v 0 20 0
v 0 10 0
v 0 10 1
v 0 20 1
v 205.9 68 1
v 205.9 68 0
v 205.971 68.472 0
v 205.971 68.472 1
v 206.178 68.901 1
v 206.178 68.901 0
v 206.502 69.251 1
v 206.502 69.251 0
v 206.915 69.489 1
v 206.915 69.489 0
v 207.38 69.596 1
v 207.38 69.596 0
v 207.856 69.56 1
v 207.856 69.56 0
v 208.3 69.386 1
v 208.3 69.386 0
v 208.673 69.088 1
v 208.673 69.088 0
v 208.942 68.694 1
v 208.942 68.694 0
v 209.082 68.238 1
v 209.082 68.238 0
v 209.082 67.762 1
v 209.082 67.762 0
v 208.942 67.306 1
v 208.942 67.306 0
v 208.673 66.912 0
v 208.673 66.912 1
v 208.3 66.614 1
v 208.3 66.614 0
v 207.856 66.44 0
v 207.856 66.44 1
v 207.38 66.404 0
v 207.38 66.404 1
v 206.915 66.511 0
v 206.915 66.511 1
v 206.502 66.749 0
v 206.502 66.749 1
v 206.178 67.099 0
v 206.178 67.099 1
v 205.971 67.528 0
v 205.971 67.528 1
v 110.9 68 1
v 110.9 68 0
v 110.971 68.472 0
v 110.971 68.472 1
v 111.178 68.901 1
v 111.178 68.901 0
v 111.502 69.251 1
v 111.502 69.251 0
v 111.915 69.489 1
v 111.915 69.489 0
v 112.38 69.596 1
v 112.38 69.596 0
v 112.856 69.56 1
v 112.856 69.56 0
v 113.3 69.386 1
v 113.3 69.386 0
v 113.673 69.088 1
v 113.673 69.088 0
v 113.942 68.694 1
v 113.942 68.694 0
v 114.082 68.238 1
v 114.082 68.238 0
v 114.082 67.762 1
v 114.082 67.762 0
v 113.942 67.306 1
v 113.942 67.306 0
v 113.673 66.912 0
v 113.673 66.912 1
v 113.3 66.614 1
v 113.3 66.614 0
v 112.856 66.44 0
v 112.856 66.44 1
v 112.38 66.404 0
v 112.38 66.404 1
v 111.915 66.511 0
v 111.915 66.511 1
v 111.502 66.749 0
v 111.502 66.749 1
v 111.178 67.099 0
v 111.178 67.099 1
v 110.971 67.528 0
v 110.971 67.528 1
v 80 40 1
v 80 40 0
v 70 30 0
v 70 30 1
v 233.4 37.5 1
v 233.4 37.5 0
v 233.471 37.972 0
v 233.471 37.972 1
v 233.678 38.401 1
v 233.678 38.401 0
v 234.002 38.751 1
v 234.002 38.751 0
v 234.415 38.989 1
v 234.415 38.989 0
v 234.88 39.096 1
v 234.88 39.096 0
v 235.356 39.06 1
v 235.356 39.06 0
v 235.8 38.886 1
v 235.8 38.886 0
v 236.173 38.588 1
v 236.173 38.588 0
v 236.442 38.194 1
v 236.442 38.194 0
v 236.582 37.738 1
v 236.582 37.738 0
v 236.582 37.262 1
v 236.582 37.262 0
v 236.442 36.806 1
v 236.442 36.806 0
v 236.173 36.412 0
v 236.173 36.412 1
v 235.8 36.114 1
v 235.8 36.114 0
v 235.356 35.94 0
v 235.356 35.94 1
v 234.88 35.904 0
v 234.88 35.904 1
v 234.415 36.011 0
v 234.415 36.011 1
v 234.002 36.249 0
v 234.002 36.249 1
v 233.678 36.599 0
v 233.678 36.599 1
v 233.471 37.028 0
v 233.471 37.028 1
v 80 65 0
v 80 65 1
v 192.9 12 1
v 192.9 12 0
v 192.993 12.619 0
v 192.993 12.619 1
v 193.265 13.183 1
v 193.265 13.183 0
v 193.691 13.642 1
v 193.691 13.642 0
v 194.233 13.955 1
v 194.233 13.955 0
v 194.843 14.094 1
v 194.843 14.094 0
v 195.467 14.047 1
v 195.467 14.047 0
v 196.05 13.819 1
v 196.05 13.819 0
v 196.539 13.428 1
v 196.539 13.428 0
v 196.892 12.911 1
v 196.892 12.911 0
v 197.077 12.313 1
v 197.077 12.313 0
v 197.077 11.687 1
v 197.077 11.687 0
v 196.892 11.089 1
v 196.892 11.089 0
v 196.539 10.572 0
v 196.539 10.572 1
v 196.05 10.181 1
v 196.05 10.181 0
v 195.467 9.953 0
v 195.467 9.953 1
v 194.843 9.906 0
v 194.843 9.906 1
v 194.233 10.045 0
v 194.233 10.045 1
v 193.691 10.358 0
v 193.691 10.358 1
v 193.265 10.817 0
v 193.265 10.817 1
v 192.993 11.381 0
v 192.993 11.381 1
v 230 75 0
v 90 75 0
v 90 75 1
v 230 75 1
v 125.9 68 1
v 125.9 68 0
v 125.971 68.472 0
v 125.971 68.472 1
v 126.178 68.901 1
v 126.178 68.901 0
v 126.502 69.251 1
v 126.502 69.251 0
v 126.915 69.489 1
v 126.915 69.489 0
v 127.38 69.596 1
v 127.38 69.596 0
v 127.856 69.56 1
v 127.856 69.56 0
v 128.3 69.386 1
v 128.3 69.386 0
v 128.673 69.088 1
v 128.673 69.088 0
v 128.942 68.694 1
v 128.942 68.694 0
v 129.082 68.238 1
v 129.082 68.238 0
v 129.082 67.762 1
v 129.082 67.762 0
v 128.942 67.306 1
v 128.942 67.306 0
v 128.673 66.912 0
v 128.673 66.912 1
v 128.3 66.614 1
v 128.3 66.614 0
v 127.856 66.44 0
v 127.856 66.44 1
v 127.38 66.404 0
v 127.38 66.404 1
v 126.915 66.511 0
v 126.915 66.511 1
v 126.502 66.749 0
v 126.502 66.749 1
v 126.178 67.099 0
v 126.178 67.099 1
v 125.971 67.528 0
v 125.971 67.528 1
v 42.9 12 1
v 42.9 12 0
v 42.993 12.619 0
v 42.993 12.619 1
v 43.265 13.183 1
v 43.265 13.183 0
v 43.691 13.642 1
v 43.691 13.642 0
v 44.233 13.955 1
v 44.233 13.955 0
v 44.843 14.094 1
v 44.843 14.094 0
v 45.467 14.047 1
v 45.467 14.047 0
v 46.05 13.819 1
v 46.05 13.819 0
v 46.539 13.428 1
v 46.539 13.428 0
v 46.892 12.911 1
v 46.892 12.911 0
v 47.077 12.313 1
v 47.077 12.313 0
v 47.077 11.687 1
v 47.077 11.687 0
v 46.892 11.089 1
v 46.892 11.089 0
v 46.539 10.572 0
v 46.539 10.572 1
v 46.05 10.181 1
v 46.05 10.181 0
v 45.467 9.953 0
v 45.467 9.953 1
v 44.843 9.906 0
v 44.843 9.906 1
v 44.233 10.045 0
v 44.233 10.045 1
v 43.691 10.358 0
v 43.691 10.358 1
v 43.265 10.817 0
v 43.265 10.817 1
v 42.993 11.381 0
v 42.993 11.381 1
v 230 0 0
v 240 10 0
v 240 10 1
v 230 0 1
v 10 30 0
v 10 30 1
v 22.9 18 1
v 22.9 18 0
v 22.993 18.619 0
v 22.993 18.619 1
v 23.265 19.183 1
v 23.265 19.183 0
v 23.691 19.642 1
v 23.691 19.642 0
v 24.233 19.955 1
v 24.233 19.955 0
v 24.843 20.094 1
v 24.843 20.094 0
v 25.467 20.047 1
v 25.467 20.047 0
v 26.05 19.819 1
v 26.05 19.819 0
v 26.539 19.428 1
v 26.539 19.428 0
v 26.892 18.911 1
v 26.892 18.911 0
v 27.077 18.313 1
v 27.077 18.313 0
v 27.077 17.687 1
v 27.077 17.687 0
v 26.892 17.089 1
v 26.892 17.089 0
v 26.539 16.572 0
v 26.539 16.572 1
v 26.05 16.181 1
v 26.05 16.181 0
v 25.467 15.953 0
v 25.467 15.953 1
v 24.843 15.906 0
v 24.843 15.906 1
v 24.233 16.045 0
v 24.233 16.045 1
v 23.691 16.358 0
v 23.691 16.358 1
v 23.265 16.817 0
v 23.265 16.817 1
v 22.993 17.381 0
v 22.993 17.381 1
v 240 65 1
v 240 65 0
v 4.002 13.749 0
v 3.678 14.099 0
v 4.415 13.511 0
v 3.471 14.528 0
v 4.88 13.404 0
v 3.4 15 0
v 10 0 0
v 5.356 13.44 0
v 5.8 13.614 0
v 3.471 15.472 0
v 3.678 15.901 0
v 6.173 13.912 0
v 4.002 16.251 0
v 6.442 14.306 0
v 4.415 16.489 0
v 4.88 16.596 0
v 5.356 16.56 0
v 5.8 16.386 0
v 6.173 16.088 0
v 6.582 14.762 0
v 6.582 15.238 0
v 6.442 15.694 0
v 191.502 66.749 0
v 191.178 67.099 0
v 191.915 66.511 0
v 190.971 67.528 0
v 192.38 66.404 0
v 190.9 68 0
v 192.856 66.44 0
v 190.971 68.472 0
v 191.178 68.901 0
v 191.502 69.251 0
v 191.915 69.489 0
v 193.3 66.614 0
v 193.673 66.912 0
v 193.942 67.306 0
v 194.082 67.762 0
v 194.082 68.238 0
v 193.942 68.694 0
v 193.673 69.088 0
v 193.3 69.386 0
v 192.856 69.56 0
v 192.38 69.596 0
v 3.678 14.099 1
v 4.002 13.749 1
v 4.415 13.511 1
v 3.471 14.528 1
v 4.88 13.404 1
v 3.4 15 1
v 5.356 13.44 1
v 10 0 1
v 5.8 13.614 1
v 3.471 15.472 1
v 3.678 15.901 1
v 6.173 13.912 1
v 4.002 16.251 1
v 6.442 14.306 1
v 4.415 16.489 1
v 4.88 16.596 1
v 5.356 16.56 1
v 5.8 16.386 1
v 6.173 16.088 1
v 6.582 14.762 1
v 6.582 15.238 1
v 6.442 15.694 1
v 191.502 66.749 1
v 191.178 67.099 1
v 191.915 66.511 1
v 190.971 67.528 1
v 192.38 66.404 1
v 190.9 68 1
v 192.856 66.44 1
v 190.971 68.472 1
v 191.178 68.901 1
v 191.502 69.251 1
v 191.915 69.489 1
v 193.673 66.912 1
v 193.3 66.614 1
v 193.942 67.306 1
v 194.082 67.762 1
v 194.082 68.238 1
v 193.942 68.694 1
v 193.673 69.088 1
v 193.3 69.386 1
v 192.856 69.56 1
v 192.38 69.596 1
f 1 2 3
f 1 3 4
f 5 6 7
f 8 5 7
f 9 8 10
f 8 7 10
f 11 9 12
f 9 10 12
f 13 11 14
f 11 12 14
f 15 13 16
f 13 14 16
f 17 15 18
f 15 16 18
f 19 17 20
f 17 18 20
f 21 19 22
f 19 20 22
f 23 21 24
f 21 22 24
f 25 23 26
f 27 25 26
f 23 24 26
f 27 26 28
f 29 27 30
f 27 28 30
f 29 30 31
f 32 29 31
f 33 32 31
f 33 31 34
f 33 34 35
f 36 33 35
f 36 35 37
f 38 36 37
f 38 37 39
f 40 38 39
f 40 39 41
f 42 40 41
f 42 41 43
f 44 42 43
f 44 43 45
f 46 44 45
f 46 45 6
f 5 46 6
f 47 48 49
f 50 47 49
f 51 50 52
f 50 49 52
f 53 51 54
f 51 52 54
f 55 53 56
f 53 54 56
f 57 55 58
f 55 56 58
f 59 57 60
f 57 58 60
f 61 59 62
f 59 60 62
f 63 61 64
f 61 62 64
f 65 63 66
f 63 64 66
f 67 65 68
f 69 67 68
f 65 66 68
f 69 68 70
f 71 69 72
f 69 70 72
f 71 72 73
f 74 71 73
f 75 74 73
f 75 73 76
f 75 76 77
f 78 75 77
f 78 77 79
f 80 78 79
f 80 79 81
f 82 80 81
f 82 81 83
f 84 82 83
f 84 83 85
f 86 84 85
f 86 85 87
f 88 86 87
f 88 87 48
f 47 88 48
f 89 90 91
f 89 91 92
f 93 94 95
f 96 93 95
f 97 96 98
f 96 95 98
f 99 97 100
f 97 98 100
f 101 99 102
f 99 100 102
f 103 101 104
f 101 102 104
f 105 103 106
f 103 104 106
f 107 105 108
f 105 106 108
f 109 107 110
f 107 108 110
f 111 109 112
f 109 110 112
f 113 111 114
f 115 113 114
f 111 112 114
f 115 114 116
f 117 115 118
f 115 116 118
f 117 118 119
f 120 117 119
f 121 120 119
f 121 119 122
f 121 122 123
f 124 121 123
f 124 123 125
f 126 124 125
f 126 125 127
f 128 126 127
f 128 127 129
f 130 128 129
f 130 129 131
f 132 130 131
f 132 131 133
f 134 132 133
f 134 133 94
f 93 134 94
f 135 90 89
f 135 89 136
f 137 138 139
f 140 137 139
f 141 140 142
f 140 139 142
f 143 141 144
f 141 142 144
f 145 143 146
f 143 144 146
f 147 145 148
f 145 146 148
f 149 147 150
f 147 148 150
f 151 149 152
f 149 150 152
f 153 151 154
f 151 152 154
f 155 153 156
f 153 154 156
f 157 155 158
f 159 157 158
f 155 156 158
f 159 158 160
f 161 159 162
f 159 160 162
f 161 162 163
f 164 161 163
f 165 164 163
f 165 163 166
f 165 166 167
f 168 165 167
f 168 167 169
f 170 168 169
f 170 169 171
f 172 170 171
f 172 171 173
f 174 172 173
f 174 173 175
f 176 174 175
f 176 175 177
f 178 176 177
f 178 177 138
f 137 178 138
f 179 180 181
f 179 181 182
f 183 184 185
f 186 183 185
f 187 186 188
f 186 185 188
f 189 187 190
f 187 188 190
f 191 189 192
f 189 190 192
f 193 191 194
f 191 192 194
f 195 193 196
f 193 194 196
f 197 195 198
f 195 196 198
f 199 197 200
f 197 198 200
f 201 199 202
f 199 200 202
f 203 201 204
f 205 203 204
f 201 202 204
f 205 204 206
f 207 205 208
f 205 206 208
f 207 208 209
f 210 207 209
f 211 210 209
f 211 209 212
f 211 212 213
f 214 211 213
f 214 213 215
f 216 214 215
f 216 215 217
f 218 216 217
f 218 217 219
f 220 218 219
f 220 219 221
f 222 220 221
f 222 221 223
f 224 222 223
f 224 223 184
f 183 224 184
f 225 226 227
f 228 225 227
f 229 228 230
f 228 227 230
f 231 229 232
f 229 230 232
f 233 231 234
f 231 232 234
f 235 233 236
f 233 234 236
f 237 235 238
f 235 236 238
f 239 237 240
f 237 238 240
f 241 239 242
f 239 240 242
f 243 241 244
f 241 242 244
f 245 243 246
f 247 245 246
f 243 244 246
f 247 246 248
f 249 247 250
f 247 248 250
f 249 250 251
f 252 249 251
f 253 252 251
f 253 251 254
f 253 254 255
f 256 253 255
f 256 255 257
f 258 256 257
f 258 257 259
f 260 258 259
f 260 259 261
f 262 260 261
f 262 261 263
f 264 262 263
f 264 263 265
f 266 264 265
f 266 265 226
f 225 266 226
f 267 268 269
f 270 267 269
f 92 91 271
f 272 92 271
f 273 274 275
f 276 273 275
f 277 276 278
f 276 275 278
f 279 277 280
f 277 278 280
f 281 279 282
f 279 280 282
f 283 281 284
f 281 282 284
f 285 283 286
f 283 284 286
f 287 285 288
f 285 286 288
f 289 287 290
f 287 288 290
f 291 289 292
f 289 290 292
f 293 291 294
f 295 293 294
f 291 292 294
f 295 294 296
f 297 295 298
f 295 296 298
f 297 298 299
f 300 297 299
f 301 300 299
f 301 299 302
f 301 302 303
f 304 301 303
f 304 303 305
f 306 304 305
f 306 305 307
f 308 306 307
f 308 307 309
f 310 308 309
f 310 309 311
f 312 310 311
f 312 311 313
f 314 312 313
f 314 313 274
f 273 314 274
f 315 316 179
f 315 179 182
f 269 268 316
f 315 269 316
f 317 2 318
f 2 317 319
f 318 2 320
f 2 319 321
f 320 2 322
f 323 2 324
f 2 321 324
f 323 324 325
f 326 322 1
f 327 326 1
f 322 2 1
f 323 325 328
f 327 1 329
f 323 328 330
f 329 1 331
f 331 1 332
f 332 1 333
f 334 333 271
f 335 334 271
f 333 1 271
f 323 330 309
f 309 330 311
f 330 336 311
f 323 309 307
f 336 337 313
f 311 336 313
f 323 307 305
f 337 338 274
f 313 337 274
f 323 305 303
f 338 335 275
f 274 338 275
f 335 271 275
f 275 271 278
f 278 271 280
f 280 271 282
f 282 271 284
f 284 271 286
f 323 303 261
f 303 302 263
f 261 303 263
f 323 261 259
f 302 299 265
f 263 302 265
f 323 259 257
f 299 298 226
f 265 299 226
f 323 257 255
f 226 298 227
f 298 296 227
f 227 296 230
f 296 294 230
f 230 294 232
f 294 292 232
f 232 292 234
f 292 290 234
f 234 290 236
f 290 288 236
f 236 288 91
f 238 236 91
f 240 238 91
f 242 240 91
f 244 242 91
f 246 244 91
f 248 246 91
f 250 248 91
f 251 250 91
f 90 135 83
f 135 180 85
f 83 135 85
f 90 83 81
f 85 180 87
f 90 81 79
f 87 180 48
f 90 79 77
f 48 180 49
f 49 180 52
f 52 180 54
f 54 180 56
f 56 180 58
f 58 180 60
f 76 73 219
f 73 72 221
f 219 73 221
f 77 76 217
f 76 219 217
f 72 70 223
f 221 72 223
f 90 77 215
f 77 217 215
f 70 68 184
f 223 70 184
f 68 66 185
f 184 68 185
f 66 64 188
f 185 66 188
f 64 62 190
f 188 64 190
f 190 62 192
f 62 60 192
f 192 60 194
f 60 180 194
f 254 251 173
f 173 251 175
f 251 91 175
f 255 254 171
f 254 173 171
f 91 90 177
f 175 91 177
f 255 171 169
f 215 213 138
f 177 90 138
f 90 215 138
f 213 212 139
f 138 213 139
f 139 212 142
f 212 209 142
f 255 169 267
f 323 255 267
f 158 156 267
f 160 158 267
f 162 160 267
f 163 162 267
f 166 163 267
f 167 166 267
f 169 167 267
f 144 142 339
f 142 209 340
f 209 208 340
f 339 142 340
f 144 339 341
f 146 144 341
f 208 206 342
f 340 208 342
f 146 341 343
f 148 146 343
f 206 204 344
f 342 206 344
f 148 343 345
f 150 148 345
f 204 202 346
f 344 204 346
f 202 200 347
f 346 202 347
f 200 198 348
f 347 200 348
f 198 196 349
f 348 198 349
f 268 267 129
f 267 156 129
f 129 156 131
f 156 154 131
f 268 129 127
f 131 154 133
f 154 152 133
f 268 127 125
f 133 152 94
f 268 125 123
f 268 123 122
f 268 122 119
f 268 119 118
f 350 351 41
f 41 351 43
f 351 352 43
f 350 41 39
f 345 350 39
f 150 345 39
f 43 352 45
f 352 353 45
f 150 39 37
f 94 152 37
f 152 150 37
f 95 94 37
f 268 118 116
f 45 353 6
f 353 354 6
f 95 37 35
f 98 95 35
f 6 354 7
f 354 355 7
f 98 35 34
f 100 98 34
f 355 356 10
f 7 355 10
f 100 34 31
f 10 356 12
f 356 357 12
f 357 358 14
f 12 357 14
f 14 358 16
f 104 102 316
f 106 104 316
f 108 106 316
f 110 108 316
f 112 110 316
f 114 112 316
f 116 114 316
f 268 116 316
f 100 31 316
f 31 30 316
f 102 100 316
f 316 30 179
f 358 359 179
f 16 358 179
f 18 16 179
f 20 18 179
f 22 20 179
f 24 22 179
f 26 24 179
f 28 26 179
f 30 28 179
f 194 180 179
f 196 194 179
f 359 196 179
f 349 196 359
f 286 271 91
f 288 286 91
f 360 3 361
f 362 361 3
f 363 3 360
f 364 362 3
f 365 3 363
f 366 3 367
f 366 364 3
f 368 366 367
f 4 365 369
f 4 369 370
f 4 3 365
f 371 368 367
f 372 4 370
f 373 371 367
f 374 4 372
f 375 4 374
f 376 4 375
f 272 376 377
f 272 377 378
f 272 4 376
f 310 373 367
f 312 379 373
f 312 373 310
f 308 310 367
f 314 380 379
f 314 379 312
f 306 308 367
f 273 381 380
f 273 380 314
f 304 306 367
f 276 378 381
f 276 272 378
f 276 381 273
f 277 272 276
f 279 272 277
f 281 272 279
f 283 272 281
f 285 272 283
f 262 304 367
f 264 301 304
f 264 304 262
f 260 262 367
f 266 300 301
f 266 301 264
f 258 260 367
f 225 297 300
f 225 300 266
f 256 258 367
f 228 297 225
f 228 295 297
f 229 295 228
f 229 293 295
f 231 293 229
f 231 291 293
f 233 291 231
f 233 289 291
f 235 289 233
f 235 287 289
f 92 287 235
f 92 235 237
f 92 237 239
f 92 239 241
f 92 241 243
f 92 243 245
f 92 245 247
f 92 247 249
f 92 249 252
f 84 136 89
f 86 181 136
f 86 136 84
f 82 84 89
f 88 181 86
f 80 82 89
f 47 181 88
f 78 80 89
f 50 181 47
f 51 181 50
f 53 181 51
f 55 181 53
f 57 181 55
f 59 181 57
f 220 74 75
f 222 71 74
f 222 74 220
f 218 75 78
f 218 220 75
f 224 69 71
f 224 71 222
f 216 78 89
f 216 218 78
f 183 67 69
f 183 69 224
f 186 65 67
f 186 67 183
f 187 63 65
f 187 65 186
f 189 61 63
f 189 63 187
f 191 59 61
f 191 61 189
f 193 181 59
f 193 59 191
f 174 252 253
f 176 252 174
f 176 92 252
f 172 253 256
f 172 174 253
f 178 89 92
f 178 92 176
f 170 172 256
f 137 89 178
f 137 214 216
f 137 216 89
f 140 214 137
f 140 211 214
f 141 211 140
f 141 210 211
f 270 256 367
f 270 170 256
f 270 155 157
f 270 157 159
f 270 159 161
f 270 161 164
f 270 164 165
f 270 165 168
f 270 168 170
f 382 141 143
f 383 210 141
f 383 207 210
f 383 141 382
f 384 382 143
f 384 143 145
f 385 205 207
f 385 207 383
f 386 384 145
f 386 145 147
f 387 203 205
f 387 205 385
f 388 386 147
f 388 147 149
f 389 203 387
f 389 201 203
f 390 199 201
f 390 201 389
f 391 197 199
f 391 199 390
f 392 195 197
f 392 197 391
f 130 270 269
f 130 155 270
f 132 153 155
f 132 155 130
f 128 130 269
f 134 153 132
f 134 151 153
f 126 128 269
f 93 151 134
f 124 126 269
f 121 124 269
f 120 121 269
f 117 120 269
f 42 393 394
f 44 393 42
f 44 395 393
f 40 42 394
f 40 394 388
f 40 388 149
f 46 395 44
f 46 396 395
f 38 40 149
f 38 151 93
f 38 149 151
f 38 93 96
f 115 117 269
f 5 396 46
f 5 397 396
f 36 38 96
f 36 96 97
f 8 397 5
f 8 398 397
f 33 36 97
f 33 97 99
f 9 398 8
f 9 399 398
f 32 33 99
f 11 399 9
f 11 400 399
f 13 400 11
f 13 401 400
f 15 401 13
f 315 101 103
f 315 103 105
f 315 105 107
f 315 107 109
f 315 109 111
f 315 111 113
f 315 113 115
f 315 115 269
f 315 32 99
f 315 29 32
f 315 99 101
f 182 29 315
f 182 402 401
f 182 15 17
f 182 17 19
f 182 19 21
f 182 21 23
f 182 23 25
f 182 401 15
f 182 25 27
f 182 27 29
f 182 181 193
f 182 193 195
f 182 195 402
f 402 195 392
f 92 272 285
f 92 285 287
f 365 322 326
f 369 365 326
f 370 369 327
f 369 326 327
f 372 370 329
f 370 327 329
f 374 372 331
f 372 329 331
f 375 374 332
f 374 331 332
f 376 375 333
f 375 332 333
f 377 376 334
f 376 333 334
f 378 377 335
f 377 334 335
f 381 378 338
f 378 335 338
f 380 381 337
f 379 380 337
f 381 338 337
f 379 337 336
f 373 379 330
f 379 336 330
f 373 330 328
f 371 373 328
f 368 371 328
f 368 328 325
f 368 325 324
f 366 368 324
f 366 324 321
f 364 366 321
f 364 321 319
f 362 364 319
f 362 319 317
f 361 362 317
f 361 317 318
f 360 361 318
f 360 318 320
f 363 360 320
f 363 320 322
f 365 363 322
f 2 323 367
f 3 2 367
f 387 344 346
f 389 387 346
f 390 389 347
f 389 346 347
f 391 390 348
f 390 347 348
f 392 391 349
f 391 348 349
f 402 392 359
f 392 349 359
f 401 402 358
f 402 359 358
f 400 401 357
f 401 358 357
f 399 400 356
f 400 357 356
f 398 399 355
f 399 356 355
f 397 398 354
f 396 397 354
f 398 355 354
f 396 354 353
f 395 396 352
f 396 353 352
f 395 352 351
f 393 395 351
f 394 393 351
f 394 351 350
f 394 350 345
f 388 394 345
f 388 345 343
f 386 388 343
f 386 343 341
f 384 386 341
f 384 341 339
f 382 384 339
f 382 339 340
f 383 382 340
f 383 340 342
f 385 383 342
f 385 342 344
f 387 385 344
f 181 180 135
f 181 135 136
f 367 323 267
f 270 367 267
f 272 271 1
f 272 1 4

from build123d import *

# Parameters (mm, degrees)
SKETCH_1_W          = 240
SKETCH_1_H          = 75
EXTRUDE_1_DEPTH     = 1
SKETCH_4_W          = 80
SKETCH_4_H          = 45
CUT_EXTRUDE_3_DEPTH = 10
CHAMFER_1_SIZE      = 10
SKETCH_5_R          = 1.6
SKETCH_5_R_2        = 2.1
CUT_EXTRUDE_4_DEPTH = 10


with BuildPart() as part:
    # 草图1 → 凸台-拉伸1 (new body)
    with BuildSketch(Plane.XY):
        with Locations((120, 37.5)):
            Rectangle(SKETCH_1_W, SKETCH_1_H)
    extrude(amount=EXTRUDE_1_DEPTH)

    # 草图4 → 切除-拉伸3 (cut)
    with BuildSketch(Plane(origin=(0, 0, 0), x_dir=(-1, 0, 0), z_dir=(0, 0, -1))):
        with Locations((-40, 52.5)):
            Rectangle(SKETCH_4_W, SKETCH_4_H)
    extrude(amount=-CUT_EXTRUDE_3_DEPTH, mode=Mode.SUBTRACT)

    # 倒角1
    chamfer_1_edges = [part.edges().sort_by_distance(p)[0] for p in [
        (80, 75, 0.5),
        (0, 30, 0.5),
        (80, 30, 0.5),
        (240, 75, 0.5),
        (240, 0, 0.5),
        (0, 0, 0.5),
    ]]
    chamfer(chamfer_1_edges, length=CHAMFER_1_SIZE)

    # 草图5 → 切除-拉伸4 (cut)
    with BuildSketch(Plane(origin=(0, 0, 0), x_dir=(-1, 0, 0), z_dir=(0, 0, -1))):
        with Locations((-5, 15)):
            Circle(SKETCH_5_R)
        with Locations((-195, 12)):
            Circle(SKETCH_5_R_2)
        with Locations((-45, 12)):
            Circle(SKETCH_5_R_2)
        with Locations((-235, 37.5)):
            Circle(SKETCH_5_R)
        with Locations((-207.5, 68)):
            Circle(SKETCH_5_R)
        with Locations((-192.5, 68)):
            Circle(SKETCH_5_R)
        with Locations((-127.5, 68)):
            Circle(SKETCH_5_R)
        with Locations((-112.5, 68)):
            Circle(SKETCH_5_R)
        with Locations((-25, 18)):
            Circle(SKETCH_5_R_2)
    extrude(amount=-CUT_EXTRUDE_4_DEPTH, mode=Mode.SUBTRACT)


solid = part.part
